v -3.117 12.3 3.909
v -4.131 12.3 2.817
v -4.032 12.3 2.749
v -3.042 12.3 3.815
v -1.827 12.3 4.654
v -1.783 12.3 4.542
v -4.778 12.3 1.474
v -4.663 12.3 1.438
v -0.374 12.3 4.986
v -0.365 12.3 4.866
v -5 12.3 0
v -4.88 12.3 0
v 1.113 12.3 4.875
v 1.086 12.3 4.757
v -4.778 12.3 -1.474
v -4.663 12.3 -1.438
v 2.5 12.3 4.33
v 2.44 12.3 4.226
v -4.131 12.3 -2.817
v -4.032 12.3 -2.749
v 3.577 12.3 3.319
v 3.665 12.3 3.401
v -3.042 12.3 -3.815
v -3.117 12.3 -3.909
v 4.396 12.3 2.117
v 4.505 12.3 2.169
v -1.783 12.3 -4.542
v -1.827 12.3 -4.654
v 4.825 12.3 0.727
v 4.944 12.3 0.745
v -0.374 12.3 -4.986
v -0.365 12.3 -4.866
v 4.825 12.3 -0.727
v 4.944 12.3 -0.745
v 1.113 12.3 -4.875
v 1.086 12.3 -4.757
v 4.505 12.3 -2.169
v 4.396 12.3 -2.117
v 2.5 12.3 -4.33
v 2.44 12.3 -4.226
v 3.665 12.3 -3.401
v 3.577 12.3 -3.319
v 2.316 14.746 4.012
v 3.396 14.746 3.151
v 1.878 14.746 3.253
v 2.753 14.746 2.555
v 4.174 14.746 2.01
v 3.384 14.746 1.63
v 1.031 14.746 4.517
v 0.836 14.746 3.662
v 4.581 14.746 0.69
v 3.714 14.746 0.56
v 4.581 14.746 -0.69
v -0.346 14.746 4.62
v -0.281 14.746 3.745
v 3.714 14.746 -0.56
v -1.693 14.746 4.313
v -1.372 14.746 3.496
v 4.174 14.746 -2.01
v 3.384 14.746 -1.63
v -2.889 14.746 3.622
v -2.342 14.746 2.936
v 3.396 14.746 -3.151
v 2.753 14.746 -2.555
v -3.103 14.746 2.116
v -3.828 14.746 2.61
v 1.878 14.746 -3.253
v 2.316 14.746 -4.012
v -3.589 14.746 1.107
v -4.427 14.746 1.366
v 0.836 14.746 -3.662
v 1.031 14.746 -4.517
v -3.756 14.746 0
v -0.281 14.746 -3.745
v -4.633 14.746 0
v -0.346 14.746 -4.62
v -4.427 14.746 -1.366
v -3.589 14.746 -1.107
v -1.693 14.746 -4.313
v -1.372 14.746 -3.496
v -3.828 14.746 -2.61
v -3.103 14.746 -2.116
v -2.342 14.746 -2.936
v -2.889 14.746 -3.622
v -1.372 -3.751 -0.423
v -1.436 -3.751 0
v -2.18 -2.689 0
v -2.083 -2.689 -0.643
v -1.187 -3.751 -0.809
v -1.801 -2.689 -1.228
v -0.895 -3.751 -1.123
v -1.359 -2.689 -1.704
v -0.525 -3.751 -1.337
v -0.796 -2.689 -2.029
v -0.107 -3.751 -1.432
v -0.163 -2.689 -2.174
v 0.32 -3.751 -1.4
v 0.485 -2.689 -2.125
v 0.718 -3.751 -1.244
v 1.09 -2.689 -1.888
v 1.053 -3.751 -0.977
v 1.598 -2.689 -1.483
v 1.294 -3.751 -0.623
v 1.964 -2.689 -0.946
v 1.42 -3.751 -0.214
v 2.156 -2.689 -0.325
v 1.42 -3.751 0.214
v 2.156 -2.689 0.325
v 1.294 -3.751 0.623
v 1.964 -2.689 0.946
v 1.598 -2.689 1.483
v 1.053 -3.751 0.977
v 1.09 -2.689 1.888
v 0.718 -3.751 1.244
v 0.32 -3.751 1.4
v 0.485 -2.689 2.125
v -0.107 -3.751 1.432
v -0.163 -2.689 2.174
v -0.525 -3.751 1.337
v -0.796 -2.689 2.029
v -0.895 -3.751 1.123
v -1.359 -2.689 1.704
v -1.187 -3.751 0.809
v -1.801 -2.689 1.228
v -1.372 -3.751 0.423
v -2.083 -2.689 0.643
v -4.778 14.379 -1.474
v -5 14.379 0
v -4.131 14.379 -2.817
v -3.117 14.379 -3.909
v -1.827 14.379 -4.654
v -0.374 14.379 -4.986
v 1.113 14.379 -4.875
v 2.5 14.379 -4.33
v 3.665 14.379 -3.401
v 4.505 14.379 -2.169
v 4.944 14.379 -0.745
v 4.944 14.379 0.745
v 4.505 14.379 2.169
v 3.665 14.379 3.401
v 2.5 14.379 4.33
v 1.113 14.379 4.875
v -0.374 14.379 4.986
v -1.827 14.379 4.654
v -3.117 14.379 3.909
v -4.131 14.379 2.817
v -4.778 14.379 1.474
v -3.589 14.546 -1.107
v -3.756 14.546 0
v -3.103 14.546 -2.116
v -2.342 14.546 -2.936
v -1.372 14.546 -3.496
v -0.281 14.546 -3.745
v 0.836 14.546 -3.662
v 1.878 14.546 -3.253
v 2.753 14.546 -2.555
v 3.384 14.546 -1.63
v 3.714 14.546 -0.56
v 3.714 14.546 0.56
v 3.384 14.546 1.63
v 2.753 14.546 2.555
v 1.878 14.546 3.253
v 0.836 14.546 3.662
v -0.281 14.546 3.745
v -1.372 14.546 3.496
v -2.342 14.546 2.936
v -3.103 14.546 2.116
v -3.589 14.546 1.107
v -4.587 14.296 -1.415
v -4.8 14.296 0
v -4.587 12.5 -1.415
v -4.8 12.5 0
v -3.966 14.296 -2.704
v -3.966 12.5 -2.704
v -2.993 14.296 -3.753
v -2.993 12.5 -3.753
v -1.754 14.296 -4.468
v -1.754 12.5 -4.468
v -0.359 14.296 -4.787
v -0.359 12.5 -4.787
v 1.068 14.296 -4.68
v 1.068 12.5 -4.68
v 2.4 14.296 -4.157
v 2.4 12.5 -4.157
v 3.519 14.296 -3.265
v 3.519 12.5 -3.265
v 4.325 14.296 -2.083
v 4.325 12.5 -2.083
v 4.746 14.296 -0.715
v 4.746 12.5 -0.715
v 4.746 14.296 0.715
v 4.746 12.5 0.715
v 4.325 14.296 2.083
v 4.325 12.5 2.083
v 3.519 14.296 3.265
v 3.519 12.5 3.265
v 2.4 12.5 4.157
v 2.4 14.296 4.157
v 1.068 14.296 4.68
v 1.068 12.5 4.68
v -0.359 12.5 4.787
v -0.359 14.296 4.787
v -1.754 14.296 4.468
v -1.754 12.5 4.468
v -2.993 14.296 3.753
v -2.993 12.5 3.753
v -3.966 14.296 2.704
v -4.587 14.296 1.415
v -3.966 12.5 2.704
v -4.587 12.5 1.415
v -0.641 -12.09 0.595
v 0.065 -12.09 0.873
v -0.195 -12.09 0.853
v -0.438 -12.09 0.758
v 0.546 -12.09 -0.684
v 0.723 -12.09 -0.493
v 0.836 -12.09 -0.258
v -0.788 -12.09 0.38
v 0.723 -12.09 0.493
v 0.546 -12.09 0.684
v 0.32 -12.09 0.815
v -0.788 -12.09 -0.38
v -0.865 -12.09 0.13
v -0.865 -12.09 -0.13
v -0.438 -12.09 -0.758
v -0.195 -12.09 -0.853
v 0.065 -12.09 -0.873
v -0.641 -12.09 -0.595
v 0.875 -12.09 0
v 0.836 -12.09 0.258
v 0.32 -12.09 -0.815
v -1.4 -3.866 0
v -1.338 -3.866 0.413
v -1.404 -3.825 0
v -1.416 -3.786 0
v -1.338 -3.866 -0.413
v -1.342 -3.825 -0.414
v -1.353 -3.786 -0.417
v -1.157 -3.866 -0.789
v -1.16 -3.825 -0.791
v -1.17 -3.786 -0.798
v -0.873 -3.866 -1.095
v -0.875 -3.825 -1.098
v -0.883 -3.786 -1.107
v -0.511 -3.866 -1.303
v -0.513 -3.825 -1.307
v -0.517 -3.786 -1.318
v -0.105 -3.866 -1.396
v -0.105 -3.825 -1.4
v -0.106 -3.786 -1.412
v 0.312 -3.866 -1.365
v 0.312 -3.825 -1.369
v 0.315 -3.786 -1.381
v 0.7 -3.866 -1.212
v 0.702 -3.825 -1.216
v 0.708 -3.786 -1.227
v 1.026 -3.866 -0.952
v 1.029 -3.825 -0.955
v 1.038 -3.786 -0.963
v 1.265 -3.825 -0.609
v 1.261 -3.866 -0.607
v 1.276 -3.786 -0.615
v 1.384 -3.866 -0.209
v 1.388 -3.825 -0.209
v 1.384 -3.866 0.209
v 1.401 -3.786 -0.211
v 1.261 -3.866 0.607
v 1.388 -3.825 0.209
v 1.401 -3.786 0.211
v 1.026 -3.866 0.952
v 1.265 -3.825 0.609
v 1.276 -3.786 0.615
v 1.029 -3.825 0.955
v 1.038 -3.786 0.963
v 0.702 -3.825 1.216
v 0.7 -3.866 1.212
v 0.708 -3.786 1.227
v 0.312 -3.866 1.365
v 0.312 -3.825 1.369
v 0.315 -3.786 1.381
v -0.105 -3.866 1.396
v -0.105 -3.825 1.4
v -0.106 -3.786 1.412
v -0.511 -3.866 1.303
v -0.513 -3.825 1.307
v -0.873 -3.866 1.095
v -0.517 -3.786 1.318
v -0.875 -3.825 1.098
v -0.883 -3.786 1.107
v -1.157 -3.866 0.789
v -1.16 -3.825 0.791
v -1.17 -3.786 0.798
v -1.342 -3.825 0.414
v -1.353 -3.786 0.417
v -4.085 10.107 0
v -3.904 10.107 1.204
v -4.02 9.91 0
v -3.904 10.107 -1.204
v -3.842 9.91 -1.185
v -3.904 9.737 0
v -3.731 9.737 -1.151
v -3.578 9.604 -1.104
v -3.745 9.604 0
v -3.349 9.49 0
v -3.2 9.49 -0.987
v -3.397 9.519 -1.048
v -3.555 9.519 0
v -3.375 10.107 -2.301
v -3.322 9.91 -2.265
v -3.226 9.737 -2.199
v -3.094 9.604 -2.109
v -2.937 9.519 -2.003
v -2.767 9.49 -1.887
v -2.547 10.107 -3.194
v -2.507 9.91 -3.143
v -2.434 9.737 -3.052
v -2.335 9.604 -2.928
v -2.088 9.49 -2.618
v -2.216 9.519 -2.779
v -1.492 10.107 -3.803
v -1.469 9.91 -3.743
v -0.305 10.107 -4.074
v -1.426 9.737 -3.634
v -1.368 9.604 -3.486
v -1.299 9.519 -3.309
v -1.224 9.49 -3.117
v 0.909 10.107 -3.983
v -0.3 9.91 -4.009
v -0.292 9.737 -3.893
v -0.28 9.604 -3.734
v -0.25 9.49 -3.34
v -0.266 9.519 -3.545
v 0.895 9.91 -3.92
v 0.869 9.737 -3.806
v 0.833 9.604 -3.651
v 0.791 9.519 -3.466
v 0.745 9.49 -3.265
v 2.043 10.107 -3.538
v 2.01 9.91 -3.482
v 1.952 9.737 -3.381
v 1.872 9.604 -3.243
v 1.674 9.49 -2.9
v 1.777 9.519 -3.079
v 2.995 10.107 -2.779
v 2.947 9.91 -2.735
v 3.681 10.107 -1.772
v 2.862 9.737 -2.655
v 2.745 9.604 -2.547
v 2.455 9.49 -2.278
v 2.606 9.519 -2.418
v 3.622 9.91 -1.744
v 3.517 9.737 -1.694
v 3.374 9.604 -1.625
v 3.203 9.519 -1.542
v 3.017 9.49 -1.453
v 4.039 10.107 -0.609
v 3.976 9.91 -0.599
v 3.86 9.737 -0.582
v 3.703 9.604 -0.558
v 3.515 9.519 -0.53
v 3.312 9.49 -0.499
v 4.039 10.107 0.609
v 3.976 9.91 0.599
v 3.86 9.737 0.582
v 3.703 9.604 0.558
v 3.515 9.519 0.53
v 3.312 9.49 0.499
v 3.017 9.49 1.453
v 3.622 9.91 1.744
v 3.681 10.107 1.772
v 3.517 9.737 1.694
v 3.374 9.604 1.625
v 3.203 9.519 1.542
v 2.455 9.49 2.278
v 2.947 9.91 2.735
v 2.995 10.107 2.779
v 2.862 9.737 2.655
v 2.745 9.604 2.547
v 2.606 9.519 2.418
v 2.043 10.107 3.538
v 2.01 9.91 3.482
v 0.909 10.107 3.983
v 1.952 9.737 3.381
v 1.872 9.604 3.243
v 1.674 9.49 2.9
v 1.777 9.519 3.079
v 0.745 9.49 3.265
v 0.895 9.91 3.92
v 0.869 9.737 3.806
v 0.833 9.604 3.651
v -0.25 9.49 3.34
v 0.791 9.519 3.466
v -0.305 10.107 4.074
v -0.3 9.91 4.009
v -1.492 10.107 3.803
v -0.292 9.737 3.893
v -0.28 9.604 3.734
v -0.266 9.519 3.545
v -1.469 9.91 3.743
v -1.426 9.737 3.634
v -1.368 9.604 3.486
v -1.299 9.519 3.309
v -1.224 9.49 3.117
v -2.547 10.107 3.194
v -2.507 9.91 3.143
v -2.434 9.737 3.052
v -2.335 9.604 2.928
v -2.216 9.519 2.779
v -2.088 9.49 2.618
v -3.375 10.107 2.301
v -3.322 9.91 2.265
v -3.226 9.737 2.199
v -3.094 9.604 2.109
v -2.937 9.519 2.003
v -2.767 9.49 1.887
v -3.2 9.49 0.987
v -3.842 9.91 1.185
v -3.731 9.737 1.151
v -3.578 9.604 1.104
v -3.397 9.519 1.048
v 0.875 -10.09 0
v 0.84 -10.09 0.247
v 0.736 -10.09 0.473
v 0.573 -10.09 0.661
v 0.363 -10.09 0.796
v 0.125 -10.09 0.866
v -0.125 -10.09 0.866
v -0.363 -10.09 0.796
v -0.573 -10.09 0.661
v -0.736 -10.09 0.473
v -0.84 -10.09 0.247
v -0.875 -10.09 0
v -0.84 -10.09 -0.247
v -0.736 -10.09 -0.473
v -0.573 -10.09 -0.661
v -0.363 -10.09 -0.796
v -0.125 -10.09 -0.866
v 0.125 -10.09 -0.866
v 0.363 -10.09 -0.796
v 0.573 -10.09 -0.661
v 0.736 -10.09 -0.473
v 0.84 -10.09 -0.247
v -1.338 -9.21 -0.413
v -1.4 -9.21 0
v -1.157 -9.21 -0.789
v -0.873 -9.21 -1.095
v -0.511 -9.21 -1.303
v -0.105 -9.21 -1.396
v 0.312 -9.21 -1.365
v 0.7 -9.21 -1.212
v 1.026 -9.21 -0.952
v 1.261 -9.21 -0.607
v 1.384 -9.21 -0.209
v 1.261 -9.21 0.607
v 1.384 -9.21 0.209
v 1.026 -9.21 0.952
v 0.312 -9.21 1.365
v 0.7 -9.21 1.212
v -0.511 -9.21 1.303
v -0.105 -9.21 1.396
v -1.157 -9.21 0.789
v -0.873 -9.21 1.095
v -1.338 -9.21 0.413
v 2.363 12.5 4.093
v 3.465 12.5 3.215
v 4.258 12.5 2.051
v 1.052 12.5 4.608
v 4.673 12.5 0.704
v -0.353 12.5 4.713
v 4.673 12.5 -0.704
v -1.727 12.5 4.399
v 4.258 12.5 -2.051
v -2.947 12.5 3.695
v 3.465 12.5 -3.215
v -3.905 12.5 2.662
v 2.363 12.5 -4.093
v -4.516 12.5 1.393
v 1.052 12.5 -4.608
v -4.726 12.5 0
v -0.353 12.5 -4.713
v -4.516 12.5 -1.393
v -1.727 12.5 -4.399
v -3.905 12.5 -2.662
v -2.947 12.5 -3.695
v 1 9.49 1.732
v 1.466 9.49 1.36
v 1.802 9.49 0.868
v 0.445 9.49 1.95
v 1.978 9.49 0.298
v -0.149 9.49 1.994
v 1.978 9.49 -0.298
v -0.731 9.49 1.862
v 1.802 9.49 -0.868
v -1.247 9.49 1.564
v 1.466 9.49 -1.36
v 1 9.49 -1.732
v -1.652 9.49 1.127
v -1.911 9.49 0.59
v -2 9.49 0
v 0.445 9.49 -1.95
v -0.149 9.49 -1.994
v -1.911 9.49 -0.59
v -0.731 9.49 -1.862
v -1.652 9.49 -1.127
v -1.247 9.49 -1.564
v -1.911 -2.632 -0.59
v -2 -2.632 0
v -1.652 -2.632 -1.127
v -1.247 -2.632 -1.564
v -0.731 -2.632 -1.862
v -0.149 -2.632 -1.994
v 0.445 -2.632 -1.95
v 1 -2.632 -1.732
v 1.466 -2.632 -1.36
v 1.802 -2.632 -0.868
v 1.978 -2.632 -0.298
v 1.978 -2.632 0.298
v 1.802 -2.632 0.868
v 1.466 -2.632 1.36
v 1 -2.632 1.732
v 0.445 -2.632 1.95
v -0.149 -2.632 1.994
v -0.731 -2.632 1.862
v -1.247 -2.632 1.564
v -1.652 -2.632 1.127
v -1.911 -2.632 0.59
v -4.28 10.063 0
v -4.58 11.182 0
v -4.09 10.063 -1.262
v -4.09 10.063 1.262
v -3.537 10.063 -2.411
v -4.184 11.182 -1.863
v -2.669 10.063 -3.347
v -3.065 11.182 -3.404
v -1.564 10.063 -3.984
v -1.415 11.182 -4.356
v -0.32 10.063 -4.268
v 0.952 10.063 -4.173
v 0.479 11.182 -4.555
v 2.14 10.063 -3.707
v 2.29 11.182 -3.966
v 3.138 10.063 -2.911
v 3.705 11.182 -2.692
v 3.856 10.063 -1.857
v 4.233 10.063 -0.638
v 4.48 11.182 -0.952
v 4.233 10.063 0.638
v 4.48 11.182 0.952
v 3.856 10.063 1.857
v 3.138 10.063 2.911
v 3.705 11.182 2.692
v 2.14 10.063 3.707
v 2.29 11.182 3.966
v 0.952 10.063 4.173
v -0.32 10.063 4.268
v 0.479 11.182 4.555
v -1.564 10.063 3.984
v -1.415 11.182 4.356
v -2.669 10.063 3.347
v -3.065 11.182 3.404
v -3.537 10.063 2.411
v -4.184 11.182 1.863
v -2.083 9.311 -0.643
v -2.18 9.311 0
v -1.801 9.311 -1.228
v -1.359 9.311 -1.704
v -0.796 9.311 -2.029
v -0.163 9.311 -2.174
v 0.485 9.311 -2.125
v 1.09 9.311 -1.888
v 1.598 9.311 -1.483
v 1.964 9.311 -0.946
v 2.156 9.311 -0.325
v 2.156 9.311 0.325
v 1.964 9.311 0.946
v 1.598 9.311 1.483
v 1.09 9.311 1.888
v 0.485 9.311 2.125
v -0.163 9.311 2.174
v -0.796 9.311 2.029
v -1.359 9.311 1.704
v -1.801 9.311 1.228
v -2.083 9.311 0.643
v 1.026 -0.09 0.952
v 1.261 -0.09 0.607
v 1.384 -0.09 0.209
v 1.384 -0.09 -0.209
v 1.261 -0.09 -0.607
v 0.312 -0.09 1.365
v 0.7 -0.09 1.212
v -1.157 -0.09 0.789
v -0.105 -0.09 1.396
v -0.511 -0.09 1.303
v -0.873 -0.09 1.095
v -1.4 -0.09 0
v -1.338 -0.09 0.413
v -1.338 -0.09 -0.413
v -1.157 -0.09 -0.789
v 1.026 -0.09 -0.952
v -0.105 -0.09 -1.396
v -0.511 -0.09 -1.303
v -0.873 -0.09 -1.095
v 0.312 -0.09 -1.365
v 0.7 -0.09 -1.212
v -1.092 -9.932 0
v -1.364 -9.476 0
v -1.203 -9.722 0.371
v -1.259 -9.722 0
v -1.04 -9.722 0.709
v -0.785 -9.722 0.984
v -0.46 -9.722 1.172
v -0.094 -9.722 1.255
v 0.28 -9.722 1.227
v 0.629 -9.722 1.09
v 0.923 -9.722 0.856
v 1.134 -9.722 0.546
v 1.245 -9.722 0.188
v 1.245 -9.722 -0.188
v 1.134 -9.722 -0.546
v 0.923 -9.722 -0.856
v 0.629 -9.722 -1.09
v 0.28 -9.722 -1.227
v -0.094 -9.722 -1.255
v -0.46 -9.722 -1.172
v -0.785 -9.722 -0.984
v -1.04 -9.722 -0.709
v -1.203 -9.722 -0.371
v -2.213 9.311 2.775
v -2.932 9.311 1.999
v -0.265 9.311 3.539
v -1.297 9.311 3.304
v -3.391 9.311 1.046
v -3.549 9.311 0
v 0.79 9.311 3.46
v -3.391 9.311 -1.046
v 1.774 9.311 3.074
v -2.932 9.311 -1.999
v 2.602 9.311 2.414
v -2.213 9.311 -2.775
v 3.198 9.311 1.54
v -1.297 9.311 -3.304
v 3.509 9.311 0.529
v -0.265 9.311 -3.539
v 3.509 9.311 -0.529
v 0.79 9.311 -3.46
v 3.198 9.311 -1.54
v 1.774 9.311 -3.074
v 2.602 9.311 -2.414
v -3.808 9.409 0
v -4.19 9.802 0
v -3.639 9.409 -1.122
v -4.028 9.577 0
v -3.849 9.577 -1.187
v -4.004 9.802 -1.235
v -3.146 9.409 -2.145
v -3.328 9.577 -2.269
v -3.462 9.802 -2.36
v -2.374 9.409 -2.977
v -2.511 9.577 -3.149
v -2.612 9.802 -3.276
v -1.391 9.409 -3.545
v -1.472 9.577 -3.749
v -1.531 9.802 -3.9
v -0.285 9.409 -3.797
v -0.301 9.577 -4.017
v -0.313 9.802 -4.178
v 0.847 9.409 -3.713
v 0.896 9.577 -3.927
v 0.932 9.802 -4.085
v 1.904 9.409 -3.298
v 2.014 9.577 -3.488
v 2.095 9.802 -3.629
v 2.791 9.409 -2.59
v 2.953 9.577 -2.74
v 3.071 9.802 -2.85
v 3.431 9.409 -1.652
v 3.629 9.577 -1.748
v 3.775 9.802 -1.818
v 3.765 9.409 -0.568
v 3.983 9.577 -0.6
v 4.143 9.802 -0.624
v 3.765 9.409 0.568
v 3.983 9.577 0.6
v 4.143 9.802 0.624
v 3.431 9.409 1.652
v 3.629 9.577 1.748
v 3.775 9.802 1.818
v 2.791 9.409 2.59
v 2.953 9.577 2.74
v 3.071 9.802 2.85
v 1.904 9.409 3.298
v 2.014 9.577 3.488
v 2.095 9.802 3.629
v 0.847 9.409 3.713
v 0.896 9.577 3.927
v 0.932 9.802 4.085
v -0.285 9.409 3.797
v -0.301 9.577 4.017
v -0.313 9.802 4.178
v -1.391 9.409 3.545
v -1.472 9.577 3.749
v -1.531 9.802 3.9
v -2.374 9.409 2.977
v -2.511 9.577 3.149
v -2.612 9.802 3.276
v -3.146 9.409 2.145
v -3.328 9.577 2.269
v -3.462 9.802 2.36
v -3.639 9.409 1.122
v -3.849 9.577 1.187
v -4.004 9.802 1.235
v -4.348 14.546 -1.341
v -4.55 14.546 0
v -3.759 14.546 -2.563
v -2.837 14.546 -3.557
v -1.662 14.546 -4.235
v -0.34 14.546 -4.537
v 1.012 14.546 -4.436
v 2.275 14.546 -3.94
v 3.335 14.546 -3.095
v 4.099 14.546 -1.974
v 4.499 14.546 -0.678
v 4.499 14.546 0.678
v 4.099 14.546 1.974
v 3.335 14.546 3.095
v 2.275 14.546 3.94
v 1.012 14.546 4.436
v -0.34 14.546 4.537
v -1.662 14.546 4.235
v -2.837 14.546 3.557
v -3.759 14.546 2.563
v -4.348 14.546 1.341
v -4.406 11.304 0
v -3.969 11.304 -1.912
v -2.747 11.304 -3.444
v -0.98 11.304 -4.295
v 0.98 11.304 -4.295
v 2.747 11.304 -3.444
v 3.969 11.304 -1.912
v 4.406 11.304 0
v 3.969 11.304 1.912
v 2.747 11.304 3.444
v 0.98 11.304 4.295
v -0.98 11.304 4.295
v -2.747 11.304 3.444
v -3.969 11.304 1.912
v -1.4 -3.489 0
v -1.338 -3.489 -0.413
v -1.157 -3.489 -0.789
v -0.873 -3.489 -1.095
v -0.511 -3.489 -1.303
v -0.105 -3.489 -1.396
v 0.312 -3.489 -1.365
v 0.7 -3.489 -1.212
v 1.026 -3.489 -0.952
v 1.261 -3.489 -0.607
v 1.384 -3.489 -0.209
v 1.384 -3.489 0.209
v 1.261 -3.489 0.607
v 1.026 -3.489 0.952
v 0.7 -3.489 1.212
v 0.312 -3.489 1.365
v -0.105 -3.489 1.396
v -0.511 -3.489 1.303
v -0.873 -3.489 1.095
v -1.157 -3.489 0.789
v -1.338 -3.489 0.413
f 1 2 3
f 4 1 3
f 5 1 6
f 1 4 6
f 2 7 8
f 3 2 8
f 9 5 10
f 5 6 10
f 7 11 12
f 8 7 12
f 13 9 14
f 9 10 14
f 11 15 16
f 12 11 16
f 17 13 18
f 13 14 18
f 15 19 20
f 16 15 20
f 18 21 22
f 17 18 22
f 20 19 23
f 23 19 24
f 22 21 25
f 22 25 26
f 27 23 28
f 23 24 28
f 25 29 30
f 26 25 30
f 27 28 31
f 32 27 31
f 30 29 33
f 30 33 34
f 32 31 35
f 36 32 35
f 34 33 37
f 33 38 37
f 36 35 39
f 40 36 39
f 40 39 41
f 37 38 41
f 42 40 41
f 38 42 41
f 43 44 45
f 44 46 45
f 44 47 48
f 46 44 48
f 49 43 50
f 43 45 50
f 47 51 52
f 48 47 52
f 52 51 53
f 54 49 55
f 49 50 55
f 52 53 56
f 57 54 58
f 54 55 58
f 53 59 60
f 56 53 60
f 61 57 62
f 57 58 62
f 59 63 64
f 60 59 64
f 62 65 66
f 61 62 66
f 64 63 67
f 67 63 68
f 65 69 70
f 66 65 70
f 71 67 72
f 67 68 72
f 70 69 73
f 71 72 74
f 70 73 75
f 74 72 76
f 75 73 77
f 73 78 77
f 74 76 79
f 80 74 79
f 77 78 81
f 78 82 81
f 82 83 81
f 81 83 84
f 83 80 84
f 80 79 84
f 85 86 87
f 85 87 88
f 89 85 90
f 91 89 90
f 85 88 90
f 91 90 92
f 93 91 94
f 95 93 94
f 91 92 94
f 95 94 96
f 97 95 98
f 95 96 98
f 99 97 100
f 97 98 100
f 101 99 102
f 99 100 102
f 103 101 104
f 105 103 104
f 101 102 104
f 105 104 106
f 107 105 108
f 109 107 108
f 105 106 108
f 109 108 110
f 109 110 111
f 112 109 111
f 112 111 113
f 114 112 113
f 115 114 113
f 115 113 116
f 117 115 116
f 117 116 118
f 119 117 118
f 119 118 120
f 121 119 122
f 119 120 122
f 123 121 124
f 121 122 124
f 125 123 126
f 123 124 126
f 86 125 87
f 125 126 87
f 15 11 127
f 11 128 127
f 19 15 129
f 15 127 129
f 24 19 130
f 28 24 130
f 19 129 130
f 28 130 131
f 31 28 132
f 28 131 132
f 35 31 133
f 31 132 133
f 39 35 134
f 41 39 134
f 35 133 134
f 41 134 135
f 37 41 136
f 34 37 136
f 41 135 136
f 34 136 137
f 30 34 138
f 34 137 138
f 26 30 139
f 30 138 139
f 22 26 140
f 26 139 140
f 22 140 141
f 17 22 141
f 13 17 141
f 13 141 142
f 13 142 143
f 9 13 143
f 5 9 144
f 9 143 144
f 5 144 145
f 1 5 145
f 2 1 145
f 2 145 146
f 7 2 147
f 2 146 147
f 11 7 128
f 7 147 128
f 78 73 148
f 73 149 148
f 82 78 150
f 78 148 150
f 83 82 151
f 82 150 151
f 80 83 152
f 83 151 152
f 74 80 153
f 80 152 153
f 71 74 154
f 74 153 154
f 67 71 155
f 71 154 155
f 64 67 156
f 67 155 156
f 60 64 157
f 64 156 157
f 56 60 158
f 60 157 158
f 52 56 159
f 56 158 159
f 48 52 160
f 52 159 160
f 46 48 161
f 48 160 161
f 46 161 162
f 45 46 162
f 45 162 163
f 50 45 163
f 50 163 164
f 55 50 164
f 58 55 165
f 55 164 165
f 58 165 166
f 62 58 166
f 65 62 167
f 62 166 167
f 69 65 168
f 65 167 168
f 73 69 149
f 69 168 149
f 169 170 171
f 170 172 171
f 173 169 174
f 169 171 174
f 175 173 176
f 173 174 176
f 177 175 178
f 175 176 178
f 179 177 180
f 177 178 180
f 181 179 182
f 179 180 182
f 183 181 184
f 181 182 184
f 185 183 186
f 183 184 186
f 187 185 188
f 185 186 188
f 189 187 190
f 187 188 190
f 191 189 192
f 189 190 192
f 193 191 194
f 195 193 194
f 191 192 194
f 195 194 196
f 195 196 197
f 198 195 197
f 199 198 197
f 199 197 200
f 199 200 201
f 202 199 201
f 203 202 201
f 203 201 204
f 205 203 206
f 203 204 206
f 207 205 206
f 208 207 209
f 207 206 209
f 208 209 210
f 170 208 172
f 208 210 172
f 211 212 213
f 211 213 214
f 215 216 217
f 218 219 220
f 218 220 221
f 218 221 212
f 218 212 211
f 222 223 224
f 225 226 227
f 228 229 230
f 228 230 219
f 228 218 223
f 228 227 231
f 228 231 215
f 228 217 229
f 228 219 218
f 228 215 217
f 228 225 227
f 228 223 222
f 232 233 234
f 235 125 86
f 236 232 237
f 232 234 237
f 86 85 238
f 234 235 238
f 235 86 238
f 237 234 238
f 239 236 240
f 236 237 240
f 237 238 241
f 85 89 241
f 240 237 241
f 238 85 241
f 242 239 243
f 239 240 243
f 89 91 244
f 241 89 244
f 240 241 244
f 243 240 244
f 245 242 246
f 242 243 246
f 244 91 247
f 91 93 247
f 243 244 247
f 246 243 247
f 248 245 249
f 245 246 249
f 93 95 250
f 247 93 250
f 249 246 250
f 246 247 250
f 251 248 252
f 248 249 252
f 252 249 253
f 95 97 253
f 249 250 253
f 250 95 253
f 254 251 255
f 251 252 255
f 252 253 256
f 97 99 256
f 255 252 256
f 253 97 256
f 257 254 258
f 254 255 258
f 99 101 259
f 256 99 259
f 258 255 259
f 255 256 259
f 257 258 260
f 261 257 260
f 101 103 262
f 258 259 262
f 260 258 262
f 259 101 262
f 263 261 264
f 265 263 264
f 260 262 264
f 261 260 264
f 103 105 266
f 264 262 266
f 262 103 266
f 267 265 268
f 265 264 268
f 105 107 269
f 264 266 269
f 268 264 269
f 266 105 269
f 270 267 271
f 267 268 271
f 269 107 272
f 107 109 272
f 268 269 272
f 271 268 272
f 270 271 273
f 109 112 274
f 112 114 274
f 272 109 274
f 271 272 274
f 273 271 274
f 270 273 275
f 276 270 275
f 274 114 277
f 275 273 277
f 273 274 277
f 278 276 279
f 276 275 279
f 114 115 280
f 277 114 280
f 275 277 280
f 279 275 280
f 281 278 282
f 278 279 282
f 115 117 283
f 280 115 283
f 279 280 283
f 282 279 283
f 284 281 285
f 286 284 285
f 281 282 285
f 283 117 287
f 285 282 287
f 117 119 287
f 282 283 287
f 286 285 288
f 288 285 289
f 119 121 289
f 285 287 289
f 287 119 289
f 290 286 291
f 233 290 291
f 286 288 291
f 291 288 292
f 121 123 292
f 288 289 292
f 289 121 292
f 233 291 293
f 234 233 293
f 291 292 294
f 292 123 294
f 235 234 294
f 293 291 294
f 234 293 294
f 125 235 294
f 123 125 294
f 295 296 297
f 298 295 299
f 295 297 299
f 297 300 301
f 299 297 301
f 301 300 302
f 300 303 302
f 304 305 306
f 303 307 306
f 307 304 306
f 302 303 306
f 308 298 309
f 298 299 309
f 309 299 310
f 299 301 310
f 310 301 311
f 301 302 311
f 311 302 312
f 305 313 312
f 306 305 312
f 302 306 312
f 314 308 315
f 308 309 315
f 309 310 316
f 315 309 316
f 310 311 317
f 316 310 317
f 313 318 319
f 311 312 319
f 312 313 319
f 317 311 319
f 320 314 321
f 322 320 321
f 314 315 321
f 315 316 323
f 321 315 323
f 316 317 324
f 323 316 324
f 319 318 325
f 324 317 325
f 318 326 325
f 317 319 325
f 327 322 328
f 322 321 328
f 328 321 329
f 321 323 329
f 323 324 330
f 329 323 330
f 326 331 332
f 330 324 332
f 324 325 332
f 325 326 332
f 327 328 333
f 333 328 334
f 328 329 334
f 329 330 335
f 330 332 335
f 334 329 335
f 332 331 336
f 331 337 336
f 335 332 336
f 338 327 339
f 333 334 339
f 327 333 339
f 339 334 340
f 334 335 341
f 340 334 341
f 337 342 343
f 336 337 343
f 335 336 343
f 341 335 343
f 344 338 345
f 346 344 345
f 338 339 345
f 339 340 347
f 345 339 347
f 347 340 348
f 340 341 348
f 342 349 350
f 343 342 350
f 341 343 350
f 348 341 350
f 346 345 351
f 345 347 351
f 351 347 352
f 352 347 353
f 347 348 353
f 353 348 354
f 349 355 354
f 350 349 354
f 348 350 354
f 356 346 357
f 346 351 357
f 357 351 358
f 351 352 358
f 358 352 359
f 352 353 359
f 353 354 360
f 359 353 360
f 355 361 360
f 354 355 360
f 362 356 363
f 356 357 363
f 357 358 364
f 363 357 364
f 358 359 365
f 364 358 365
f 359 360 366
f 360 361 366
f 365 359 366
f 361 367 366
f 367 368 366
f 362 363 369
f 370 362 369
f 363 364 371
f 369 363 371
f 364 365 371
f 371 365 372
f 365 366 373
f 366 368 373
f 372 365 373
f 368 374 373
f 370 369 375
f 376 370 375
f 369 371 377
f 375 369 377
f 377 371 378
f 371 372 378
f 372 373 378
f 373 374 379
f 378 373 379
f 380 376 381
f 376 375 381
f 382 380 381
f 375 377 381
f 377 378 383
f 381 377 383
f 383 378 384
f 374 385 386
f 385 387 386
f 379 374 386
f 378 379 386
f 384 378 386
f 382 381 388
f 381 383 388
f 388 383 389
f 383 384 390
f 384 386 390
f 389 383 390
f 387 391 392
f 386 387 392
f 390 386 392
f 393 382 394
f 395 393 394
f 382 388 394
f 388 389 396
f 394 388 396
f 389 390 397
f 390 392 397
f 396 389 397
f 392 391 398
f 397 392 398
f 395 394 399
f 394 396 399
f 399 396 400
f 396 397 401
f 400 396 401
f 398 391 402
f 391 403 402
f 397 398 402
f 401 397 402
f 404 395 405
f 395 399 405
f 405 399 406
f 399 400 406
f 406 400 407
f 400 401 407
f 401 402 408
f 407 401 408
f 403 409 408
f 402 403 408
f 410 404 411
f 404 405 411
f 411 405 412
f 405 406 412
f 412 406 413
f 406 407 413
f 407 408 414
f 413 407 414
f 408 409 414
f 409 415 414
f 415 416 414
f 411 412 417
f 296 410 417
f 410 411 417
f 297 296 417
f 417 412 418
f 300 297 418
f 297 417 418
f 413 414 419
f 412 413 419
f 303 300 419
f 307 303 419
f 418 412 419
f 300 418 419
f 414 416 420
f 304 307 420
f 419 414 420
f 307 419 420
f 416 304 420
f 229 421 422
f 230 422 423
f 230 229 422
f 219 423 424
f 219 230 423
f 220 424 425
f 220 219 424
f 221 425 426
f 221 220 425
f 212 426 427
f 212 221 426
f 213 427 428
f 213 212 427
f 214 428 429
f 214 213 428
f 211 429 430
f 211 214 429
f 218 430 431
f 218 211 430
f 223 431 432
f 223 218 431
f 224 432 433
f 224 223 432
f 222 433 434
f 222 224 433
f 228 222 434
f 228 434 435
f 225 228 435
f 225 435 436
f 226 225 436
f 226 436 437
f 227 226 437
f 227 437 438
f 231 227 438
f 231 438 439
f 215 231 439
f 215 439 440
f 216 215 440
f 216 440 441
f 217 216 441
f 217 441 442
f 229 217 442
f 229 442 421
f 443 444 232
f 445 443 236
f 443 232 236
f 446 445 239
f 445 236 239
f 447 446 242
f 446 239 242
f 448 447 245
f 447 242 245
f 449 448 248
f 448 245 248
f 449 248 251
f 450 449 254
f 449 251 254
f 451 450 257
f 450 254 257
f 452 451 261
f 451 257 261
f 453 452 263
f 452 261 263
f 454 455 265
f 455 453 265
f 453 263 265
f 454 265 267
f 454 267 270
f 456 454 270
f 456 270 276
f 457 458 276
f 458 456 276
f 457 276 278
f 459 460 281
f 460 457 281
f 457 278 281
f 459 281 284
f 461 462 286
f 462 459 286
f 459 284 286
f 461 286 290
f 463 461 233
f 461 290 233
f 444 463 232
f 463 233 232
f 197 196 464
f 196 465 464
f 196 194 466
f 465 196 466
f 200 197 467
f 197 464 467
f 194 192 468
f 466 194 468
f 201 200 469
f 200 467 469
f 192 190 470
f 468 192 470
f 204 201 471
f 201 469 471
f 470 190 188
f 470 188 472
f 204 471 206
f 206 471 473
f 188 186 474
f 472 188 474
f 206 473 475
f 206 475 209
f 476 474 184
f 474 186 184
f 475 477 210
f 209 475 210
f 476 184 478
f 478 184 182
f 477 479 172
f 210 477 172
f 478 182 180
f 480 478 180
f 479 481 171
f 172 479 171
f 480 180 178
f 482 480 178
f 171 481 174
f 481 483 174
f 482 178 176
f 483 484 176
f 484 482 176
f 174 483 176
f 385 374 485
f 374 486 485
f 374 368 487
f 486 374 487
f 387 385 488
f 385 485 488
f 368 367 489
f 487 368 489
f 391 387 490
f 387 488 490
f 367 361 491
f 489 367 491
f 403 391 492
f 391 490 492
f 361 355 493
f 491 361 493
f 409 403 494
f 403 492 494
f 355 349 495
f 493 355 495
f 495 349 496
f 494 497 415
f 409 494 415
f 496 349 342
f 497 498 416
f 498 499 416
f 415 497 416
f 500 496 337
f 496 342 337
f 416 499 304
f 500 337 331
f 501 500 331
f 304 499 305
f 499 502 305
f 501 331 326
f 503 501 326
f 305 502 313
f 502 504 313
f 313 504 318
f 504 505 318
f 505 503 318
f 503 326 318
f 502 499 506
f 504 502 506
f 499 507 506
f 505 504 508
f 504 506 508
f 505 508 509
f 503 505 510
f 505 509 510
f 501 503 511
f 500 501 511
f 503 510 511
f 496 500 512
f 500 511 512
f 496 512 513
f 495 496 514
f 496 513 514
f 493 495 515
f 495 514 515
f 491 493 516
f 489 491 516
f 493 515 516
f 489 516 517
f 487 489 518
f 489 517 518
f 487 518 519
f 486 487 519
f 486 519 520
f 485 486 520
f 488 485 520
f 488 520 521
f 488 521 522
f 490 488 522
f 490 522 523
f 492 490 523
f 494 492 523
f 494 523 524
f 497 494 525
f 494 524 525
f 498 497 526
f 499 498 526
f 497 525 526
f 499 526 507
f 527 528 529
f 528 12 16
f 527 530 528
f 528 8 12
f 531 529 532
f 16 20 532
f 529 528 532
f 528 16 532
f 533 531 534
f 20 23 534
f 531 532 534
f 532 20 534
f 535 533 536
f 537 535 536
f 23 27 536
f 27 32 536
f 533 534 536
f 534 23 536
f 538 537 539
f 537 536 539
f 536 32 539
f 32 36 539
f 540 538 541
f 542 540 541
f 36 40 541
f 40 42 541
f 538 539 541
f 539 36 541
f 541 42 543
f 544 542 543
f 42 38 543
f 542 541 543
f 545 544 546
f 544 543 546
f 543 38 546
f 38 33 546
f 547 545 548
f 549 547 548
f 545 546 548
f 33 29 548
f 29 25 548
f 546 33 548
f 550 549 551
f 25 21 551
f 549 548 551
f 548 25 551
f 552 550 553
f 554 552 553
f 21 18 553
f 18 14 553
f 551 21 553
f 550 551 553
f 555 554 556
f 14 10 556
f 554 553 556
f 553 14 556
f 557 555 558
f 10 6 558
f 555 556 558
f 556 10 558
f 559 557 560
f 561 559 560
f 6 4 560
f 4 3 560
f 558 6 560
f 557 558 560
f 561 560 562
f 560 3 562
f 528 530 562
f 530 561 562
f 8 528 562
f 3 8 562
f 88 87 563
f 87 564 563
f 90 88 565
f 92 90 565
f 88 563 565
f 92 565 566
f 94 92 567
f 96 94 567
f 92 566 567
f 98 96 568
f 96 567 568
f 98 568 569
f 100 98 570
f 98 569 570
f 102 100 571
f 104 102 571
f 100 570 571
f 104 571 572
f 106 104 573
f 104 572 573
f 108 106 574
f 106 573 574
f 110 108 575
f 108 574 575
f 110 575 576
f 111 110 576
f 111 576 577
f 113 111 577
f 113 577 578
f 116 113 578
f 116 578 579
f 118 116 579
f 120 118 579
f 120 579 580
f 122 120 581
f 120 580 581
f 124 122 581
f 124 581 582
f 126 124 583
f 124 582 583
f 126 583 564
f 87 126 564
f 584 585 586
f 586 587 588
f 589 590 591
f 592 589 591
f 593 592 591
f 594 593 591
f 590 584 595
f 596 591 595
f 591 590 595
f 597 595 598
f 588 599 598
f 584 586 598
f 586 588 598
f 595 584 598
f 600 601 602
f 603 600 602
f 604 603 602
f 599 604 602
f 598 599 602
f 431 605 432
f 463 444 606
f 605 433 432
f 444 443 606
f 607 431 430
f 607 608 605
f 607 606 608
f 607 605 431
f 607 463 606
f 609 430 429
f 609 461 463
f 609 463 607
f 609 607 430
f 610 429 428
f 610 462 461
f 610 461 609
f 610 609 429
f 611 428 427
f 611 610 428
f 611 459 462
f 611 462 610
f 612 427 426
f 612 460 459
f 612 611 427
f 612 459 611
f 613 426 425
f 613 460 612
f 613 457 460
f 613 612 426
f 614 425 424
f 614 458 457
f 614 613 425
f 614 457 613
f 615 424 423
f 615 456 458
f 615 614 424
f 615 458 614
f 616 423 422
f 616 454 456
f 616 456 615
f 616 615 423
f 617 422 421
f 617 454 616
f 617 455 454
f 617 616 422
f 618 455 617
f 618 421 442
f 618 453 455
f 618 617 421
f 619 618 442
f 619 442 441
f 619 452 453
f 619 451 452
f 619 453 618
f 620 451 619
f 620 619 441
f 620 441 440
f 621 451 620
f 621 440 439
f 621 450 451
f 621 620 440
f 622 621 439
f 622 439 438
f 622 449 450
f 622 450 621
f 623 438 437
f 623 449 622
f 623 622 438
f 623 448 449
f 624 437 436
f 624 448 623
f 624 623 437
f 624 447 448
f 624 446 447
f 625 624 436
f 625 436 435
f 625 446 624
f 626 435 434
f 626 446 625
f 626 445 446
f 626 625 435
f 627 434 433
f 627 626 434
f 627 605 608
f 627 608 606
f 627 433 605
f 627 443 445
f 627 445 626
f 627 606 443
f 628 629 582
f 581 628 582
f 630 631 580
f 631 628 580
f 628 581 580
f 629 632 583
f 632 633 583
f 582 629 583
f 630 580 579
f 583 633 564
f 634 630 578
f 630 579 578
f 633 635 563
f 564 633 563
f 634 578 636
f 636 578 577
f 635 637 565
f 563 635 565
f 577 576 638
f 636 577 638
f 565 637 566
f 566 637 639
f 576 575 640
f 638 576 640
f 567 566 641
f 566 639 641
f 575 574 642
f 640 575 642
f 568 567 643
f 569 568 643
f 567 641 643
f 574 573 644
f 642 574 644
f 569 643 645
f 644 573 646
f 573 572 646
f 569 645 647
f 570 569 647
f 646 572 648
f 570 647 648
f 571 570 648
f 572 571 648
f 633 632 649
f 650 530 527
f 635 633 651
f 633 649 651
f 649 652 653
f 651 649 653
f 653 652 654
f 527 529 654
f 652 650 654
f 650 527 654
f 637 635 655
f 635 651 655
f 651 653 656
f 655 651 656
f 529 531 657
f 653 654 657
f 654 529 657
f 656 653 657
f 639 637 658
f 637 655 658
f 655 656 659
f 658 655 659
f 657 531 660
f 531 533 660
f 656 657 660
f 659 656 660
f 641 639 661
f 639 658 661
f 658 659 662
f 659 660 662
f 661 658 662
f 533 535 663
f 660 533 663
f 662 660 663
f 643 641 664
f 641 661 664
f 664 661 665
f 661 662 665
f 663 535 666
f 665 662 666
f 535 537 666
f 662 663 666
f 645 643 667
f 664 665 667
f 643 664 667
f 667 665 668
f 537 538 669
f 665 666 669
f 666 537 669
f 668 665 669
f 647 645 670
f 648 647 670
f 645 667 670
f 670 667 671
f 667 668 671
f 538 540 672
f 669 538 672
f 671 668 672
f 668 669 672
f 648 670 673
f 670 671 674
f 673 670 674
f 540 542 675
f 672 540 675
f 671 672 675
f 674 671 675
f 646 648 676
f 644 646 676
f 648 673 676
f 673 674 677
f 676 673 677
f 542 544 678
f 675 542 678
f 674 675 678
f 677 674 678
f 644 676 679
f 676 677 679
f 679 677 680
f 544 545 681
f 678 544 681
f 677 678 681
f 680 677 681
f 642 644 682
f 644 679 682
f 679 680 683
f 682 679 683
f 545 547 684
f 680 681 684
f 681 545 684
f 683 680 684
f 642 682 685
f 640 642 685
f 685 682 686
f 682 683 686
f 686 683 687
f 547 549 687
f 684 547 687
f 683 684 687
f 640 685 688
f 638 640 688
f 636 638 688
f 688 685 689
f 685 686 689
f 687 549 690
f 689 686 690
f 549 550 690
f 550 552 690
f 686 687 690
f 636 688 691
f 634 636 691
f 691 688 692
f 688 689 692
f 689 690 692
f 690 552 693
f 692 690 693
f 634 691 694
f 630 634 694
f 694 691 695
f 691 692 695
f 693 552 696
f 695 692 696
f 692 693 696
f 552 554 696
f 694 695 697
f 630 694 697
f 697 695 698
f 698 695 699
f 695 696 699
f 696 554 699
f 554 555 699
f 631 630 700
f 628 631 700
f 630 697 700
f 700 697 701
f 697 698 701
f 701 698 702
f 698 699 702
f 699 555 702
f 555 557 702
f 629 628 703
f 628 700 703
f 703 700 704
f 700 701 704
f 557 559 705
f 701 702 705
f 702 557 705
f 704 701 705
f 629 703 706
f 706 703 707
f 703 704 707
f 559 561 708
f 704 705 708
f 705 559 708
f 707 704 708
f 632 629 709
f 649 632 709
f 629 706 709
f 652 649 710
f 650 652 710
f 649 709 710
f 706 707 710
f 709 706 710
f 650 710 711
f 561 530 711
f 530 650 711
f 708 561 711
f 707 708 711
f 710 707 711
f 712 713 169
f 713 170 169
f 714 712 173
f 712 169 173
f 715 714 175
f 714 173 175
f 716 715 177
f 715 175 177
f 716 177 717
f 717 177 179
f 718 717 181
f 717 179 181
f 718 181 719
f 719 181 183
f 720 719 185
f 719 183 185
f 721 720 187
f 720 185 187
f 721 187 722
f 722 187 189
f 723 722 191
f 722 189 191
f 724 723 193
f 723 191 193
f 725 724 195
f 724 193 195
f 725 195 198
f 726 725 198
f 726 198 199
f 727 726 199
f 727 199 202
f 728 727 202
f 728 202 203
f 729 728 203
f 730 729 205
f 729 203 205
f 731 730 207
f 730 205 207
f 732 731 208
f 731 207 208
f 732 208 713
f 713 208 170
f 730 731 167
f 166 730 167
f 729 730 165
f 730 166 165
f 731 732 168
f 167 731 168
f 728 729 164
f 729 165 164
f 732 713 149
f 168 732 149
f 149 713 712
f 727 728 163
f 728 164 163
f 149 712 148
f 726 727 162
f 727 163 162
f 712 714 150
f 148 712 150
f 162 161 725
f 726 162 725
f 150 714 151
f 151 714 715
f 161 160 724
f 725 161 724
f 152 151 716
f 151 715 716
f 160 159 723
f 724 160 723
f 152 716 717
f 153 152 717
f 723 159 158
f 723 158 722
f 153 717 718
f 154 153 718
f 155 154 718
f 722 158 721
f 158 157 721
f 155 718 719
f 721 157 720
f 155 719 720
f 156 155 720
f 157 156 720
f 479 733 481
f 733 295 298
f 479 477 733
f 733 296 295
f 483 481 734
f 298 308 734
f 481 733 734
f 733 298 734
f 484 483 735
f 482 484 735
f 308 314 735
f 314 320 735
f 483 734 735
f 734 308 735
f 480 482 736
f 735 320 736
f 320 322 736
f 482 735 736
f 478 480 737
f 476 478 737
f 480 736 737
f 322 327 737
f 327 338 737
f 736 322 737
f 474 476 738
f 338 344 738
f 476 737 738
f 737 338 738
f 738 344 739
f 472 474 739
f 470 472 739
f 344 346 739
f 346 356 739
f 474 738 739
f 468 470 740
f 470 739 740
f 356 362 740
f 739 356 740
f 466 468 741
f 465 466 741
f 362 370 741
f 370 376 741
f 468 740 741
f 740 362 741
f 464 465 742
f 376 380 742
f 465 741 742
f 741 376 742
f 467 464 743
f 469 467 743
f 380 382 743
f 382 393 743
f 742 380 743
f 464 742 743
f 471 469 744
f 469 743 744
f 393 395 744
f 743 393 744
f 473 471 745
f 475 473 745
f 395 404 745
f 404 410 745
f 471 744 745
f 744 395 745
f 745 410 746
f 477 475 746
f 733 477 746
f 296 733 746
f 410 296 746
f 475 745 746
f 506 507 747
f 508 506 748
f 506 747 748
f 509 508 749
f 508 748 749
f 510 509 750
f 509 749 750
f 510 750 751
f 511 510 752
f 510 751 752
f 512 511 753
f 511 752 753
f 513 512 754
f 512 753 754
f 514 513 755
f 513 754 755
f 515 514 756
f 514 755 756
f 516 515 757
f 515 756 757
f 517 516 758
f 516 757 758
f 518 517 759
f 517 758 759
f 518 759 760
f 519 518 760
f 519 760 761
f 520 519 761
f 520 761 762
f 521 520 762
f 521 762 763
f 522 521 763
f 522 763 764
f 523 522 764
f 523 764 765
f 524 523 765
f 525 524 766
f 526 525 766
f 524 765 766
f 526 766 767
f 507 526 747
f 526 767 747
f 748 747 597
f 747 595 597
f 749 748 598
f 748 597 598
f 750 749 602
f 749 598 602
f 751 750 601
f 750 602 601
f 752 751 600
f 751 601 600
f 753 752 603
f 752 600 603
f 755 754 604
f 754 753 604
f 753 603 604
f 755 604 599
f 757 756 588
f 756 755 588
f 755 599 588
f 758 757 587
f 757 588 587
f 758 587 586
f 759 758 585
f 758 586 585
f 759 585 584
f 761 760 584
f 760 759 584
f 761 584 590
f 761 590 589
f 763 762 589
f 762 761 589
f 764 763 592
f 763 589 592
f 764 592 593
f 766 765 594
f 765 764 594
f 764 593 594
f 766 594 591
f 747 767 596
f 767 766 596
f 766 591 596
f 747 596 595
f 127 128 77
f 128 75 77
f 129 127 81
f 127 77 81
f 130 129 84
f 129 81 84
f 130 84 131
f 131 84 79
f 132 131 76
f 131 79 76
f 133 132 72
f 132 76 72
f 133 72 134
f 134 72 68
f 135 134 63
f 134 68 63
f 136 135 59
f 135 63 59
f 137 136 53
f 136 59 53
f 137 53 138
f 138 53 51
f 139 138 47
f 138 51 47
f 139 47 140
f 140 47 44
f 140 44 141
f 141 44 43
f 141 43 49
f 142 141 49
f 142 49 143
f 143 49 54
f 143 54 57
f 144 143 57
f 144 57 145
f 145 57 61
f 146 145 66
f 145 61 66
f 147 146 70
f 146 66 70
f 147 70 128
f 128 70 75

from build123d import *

# Parameters (mm, degrees)
BOSS_EXTRUDE1_DEPTH      = 7
BOSS_EXTRUDE1_DEPTH_BACK = 5
SKETCH2_R                = 1.4
SKETCH3_OUTSIDE_W        = 18.066
SKETCH3_OUTSIDE_H        = 18.066
SKETCH3_OUTSIDE_R        = 0.875
CUT_EXTRUDE1_DEPTH       = 2
FILLET1_R                = 1


with BuildPart() as part:
    # Sketch1 → Revolve2 (revolve)
    with BuildSketch(Plane.XY):
        with BuildLine():
            Line((-3.755778652, 14.546362803), (-4.55, 14.546362803))
            Line((-4.55, 14.546362803), (-4.8, 14.296362803))
            Line((-4.8, 14.296362803), (-4.8, 12.499997602))
            Line((-4.8, 12.499997602), (-4.726187471, 12.499997602))
            Line((-4.726187471, 12.499997602), (-4.085093395, 10.107402835))
            ThreePointArc((-4.085093395, 10.107402835), (-3.828996553, 9.665101687), (-3.348994918, 9.489561582))
            Line((-3.348994918, 9.489561582), (-2, 9.489561582))
            Line((-2, 9.489561582), (-2, -2.631922723))
            Line((-2, -2.631922723), (-1.256169591, -3.694222639))
            ThreePointArc((-1.256169591, -3.694222639), (-1.22925661, -3.748796766), (-1.22, -3.808937926))
            Line((-1.22, -3.808937926), (-1.22, -4.710135178))
            ThreePointArc((-1.22, -4.710135178), (-1.161421356, -4.851556534), (-1.02, -4.910135178))
            Line((-1.02, -4.910135178), (0, -4.910135178))
            Line((0, -4.910135178), (0, -5.090135178))
            Line((0, -5.090135178), (-1.2, -5.090135178))
            ThreePointArc((-1.2, -5.090135178), (-1.341421356, -5.031556534), (-1.4, -4.890135178))
            Line((-1.4, -4.890135178), (-1.4, -3.865691708))
            ThreePointArc((-1.4, -3.865691708), (-1.40925661, -3.805550548), (-1.436169591, -3.750976421))
            Line((-1.436169591, -3.750976421), (-2.18, -2.688676505))
            Line((-2.18, -2.688676505), (-2.18, 9.311323495))
            Line((-2.18, 9.311323495), (-3.548994918, 9.311323495))
            ThreePointArc((-3.548994918, 9.311323495), (-4.027869138, 9.577238986), (-4.280340775, 10.063335313))
            Line((-4.280340775, 10.063335313), (-4.879652854, 12.299997602))
            Line((-4.879652854, 12.299997602), (-5, 12.299997602))
            Line((-5, 12.299997602), (-5, 14.379205516))
            Line((-5, 14.379205516), (-4.632842712, 14.746362803))
            Line((-4.632842712, 14.746362803), (-3.755778652, 14.746362803))
            Line((-3.755778652, 14.746362803), (-3.755778652, 14.546362803))
        make_face()
    revolve(axis=Axis((0, 14.5, 0), (0, -1, 0)))

    # Sketch2 → Boss-Extrude1 (add, two sides: drawn at the far end of the back side and taken through both)
    with BuildSketch(Plane.XZ.offset(5.090135178).offset(-BOSS_EXTRUDE1_DEPTH_BACK)):
        with Locations(Location((0, 0, 0), (0, 0, 180))):
            Circle(SKETCH2_R)
    extrude(amount=BOSS_EXTRUDE1_DEPTH + BOSS_EXTRUDE1_DEPTH_BACK)

    # Sketch3 outside → Cut-Extrude1 (cut)
    with BuildSketch(Plane.XZ.offset(12.090135178)):
        Rectangle(SKETCH3_OUTSIDE_W, SKETCH3_OUTSIDE_H)
        Circle(SKETCH3_OUTSIDE_R, mode=Mode.SUBTRACT)
    extrude(amount=-CUT_EXTRUDE1_DEPTH, mode=Mode.SUBTRACT)

    # Fillet1
    # the kernel refuses this fillet: 1 mm, written as the material it takes off along each edge
    with BuildSketch(Plane(origin=(0, -10.090135178, 0), x_dir=(-1, 0, 0), z_dir=(0, 0, -1))) as fillet1_piece_1:
        with BuildLine():
            CenterArc((0.4, 0.879985795), FILLET1_R, 298.359350028, 61.640649972)
            Line((0.875, 0), (0.8845, -0.017599716))
            ThreePointArc((0.8845, -0.017599716), (1.1375, -0.02), (1.4, -0.02))
            Line((1.4, -0.02), (1.42, 0))
            Line((1.42, 0), (1.42, 0.879985795))
            Line((1.42, 0.879985795), (1.4, 0.879985795))
        make_face()
    revolve(axis=Axis((0, -10.090135178, 0), (0, 1, 0)), mode=Mode.SUBTRACT)


solid = part.part
